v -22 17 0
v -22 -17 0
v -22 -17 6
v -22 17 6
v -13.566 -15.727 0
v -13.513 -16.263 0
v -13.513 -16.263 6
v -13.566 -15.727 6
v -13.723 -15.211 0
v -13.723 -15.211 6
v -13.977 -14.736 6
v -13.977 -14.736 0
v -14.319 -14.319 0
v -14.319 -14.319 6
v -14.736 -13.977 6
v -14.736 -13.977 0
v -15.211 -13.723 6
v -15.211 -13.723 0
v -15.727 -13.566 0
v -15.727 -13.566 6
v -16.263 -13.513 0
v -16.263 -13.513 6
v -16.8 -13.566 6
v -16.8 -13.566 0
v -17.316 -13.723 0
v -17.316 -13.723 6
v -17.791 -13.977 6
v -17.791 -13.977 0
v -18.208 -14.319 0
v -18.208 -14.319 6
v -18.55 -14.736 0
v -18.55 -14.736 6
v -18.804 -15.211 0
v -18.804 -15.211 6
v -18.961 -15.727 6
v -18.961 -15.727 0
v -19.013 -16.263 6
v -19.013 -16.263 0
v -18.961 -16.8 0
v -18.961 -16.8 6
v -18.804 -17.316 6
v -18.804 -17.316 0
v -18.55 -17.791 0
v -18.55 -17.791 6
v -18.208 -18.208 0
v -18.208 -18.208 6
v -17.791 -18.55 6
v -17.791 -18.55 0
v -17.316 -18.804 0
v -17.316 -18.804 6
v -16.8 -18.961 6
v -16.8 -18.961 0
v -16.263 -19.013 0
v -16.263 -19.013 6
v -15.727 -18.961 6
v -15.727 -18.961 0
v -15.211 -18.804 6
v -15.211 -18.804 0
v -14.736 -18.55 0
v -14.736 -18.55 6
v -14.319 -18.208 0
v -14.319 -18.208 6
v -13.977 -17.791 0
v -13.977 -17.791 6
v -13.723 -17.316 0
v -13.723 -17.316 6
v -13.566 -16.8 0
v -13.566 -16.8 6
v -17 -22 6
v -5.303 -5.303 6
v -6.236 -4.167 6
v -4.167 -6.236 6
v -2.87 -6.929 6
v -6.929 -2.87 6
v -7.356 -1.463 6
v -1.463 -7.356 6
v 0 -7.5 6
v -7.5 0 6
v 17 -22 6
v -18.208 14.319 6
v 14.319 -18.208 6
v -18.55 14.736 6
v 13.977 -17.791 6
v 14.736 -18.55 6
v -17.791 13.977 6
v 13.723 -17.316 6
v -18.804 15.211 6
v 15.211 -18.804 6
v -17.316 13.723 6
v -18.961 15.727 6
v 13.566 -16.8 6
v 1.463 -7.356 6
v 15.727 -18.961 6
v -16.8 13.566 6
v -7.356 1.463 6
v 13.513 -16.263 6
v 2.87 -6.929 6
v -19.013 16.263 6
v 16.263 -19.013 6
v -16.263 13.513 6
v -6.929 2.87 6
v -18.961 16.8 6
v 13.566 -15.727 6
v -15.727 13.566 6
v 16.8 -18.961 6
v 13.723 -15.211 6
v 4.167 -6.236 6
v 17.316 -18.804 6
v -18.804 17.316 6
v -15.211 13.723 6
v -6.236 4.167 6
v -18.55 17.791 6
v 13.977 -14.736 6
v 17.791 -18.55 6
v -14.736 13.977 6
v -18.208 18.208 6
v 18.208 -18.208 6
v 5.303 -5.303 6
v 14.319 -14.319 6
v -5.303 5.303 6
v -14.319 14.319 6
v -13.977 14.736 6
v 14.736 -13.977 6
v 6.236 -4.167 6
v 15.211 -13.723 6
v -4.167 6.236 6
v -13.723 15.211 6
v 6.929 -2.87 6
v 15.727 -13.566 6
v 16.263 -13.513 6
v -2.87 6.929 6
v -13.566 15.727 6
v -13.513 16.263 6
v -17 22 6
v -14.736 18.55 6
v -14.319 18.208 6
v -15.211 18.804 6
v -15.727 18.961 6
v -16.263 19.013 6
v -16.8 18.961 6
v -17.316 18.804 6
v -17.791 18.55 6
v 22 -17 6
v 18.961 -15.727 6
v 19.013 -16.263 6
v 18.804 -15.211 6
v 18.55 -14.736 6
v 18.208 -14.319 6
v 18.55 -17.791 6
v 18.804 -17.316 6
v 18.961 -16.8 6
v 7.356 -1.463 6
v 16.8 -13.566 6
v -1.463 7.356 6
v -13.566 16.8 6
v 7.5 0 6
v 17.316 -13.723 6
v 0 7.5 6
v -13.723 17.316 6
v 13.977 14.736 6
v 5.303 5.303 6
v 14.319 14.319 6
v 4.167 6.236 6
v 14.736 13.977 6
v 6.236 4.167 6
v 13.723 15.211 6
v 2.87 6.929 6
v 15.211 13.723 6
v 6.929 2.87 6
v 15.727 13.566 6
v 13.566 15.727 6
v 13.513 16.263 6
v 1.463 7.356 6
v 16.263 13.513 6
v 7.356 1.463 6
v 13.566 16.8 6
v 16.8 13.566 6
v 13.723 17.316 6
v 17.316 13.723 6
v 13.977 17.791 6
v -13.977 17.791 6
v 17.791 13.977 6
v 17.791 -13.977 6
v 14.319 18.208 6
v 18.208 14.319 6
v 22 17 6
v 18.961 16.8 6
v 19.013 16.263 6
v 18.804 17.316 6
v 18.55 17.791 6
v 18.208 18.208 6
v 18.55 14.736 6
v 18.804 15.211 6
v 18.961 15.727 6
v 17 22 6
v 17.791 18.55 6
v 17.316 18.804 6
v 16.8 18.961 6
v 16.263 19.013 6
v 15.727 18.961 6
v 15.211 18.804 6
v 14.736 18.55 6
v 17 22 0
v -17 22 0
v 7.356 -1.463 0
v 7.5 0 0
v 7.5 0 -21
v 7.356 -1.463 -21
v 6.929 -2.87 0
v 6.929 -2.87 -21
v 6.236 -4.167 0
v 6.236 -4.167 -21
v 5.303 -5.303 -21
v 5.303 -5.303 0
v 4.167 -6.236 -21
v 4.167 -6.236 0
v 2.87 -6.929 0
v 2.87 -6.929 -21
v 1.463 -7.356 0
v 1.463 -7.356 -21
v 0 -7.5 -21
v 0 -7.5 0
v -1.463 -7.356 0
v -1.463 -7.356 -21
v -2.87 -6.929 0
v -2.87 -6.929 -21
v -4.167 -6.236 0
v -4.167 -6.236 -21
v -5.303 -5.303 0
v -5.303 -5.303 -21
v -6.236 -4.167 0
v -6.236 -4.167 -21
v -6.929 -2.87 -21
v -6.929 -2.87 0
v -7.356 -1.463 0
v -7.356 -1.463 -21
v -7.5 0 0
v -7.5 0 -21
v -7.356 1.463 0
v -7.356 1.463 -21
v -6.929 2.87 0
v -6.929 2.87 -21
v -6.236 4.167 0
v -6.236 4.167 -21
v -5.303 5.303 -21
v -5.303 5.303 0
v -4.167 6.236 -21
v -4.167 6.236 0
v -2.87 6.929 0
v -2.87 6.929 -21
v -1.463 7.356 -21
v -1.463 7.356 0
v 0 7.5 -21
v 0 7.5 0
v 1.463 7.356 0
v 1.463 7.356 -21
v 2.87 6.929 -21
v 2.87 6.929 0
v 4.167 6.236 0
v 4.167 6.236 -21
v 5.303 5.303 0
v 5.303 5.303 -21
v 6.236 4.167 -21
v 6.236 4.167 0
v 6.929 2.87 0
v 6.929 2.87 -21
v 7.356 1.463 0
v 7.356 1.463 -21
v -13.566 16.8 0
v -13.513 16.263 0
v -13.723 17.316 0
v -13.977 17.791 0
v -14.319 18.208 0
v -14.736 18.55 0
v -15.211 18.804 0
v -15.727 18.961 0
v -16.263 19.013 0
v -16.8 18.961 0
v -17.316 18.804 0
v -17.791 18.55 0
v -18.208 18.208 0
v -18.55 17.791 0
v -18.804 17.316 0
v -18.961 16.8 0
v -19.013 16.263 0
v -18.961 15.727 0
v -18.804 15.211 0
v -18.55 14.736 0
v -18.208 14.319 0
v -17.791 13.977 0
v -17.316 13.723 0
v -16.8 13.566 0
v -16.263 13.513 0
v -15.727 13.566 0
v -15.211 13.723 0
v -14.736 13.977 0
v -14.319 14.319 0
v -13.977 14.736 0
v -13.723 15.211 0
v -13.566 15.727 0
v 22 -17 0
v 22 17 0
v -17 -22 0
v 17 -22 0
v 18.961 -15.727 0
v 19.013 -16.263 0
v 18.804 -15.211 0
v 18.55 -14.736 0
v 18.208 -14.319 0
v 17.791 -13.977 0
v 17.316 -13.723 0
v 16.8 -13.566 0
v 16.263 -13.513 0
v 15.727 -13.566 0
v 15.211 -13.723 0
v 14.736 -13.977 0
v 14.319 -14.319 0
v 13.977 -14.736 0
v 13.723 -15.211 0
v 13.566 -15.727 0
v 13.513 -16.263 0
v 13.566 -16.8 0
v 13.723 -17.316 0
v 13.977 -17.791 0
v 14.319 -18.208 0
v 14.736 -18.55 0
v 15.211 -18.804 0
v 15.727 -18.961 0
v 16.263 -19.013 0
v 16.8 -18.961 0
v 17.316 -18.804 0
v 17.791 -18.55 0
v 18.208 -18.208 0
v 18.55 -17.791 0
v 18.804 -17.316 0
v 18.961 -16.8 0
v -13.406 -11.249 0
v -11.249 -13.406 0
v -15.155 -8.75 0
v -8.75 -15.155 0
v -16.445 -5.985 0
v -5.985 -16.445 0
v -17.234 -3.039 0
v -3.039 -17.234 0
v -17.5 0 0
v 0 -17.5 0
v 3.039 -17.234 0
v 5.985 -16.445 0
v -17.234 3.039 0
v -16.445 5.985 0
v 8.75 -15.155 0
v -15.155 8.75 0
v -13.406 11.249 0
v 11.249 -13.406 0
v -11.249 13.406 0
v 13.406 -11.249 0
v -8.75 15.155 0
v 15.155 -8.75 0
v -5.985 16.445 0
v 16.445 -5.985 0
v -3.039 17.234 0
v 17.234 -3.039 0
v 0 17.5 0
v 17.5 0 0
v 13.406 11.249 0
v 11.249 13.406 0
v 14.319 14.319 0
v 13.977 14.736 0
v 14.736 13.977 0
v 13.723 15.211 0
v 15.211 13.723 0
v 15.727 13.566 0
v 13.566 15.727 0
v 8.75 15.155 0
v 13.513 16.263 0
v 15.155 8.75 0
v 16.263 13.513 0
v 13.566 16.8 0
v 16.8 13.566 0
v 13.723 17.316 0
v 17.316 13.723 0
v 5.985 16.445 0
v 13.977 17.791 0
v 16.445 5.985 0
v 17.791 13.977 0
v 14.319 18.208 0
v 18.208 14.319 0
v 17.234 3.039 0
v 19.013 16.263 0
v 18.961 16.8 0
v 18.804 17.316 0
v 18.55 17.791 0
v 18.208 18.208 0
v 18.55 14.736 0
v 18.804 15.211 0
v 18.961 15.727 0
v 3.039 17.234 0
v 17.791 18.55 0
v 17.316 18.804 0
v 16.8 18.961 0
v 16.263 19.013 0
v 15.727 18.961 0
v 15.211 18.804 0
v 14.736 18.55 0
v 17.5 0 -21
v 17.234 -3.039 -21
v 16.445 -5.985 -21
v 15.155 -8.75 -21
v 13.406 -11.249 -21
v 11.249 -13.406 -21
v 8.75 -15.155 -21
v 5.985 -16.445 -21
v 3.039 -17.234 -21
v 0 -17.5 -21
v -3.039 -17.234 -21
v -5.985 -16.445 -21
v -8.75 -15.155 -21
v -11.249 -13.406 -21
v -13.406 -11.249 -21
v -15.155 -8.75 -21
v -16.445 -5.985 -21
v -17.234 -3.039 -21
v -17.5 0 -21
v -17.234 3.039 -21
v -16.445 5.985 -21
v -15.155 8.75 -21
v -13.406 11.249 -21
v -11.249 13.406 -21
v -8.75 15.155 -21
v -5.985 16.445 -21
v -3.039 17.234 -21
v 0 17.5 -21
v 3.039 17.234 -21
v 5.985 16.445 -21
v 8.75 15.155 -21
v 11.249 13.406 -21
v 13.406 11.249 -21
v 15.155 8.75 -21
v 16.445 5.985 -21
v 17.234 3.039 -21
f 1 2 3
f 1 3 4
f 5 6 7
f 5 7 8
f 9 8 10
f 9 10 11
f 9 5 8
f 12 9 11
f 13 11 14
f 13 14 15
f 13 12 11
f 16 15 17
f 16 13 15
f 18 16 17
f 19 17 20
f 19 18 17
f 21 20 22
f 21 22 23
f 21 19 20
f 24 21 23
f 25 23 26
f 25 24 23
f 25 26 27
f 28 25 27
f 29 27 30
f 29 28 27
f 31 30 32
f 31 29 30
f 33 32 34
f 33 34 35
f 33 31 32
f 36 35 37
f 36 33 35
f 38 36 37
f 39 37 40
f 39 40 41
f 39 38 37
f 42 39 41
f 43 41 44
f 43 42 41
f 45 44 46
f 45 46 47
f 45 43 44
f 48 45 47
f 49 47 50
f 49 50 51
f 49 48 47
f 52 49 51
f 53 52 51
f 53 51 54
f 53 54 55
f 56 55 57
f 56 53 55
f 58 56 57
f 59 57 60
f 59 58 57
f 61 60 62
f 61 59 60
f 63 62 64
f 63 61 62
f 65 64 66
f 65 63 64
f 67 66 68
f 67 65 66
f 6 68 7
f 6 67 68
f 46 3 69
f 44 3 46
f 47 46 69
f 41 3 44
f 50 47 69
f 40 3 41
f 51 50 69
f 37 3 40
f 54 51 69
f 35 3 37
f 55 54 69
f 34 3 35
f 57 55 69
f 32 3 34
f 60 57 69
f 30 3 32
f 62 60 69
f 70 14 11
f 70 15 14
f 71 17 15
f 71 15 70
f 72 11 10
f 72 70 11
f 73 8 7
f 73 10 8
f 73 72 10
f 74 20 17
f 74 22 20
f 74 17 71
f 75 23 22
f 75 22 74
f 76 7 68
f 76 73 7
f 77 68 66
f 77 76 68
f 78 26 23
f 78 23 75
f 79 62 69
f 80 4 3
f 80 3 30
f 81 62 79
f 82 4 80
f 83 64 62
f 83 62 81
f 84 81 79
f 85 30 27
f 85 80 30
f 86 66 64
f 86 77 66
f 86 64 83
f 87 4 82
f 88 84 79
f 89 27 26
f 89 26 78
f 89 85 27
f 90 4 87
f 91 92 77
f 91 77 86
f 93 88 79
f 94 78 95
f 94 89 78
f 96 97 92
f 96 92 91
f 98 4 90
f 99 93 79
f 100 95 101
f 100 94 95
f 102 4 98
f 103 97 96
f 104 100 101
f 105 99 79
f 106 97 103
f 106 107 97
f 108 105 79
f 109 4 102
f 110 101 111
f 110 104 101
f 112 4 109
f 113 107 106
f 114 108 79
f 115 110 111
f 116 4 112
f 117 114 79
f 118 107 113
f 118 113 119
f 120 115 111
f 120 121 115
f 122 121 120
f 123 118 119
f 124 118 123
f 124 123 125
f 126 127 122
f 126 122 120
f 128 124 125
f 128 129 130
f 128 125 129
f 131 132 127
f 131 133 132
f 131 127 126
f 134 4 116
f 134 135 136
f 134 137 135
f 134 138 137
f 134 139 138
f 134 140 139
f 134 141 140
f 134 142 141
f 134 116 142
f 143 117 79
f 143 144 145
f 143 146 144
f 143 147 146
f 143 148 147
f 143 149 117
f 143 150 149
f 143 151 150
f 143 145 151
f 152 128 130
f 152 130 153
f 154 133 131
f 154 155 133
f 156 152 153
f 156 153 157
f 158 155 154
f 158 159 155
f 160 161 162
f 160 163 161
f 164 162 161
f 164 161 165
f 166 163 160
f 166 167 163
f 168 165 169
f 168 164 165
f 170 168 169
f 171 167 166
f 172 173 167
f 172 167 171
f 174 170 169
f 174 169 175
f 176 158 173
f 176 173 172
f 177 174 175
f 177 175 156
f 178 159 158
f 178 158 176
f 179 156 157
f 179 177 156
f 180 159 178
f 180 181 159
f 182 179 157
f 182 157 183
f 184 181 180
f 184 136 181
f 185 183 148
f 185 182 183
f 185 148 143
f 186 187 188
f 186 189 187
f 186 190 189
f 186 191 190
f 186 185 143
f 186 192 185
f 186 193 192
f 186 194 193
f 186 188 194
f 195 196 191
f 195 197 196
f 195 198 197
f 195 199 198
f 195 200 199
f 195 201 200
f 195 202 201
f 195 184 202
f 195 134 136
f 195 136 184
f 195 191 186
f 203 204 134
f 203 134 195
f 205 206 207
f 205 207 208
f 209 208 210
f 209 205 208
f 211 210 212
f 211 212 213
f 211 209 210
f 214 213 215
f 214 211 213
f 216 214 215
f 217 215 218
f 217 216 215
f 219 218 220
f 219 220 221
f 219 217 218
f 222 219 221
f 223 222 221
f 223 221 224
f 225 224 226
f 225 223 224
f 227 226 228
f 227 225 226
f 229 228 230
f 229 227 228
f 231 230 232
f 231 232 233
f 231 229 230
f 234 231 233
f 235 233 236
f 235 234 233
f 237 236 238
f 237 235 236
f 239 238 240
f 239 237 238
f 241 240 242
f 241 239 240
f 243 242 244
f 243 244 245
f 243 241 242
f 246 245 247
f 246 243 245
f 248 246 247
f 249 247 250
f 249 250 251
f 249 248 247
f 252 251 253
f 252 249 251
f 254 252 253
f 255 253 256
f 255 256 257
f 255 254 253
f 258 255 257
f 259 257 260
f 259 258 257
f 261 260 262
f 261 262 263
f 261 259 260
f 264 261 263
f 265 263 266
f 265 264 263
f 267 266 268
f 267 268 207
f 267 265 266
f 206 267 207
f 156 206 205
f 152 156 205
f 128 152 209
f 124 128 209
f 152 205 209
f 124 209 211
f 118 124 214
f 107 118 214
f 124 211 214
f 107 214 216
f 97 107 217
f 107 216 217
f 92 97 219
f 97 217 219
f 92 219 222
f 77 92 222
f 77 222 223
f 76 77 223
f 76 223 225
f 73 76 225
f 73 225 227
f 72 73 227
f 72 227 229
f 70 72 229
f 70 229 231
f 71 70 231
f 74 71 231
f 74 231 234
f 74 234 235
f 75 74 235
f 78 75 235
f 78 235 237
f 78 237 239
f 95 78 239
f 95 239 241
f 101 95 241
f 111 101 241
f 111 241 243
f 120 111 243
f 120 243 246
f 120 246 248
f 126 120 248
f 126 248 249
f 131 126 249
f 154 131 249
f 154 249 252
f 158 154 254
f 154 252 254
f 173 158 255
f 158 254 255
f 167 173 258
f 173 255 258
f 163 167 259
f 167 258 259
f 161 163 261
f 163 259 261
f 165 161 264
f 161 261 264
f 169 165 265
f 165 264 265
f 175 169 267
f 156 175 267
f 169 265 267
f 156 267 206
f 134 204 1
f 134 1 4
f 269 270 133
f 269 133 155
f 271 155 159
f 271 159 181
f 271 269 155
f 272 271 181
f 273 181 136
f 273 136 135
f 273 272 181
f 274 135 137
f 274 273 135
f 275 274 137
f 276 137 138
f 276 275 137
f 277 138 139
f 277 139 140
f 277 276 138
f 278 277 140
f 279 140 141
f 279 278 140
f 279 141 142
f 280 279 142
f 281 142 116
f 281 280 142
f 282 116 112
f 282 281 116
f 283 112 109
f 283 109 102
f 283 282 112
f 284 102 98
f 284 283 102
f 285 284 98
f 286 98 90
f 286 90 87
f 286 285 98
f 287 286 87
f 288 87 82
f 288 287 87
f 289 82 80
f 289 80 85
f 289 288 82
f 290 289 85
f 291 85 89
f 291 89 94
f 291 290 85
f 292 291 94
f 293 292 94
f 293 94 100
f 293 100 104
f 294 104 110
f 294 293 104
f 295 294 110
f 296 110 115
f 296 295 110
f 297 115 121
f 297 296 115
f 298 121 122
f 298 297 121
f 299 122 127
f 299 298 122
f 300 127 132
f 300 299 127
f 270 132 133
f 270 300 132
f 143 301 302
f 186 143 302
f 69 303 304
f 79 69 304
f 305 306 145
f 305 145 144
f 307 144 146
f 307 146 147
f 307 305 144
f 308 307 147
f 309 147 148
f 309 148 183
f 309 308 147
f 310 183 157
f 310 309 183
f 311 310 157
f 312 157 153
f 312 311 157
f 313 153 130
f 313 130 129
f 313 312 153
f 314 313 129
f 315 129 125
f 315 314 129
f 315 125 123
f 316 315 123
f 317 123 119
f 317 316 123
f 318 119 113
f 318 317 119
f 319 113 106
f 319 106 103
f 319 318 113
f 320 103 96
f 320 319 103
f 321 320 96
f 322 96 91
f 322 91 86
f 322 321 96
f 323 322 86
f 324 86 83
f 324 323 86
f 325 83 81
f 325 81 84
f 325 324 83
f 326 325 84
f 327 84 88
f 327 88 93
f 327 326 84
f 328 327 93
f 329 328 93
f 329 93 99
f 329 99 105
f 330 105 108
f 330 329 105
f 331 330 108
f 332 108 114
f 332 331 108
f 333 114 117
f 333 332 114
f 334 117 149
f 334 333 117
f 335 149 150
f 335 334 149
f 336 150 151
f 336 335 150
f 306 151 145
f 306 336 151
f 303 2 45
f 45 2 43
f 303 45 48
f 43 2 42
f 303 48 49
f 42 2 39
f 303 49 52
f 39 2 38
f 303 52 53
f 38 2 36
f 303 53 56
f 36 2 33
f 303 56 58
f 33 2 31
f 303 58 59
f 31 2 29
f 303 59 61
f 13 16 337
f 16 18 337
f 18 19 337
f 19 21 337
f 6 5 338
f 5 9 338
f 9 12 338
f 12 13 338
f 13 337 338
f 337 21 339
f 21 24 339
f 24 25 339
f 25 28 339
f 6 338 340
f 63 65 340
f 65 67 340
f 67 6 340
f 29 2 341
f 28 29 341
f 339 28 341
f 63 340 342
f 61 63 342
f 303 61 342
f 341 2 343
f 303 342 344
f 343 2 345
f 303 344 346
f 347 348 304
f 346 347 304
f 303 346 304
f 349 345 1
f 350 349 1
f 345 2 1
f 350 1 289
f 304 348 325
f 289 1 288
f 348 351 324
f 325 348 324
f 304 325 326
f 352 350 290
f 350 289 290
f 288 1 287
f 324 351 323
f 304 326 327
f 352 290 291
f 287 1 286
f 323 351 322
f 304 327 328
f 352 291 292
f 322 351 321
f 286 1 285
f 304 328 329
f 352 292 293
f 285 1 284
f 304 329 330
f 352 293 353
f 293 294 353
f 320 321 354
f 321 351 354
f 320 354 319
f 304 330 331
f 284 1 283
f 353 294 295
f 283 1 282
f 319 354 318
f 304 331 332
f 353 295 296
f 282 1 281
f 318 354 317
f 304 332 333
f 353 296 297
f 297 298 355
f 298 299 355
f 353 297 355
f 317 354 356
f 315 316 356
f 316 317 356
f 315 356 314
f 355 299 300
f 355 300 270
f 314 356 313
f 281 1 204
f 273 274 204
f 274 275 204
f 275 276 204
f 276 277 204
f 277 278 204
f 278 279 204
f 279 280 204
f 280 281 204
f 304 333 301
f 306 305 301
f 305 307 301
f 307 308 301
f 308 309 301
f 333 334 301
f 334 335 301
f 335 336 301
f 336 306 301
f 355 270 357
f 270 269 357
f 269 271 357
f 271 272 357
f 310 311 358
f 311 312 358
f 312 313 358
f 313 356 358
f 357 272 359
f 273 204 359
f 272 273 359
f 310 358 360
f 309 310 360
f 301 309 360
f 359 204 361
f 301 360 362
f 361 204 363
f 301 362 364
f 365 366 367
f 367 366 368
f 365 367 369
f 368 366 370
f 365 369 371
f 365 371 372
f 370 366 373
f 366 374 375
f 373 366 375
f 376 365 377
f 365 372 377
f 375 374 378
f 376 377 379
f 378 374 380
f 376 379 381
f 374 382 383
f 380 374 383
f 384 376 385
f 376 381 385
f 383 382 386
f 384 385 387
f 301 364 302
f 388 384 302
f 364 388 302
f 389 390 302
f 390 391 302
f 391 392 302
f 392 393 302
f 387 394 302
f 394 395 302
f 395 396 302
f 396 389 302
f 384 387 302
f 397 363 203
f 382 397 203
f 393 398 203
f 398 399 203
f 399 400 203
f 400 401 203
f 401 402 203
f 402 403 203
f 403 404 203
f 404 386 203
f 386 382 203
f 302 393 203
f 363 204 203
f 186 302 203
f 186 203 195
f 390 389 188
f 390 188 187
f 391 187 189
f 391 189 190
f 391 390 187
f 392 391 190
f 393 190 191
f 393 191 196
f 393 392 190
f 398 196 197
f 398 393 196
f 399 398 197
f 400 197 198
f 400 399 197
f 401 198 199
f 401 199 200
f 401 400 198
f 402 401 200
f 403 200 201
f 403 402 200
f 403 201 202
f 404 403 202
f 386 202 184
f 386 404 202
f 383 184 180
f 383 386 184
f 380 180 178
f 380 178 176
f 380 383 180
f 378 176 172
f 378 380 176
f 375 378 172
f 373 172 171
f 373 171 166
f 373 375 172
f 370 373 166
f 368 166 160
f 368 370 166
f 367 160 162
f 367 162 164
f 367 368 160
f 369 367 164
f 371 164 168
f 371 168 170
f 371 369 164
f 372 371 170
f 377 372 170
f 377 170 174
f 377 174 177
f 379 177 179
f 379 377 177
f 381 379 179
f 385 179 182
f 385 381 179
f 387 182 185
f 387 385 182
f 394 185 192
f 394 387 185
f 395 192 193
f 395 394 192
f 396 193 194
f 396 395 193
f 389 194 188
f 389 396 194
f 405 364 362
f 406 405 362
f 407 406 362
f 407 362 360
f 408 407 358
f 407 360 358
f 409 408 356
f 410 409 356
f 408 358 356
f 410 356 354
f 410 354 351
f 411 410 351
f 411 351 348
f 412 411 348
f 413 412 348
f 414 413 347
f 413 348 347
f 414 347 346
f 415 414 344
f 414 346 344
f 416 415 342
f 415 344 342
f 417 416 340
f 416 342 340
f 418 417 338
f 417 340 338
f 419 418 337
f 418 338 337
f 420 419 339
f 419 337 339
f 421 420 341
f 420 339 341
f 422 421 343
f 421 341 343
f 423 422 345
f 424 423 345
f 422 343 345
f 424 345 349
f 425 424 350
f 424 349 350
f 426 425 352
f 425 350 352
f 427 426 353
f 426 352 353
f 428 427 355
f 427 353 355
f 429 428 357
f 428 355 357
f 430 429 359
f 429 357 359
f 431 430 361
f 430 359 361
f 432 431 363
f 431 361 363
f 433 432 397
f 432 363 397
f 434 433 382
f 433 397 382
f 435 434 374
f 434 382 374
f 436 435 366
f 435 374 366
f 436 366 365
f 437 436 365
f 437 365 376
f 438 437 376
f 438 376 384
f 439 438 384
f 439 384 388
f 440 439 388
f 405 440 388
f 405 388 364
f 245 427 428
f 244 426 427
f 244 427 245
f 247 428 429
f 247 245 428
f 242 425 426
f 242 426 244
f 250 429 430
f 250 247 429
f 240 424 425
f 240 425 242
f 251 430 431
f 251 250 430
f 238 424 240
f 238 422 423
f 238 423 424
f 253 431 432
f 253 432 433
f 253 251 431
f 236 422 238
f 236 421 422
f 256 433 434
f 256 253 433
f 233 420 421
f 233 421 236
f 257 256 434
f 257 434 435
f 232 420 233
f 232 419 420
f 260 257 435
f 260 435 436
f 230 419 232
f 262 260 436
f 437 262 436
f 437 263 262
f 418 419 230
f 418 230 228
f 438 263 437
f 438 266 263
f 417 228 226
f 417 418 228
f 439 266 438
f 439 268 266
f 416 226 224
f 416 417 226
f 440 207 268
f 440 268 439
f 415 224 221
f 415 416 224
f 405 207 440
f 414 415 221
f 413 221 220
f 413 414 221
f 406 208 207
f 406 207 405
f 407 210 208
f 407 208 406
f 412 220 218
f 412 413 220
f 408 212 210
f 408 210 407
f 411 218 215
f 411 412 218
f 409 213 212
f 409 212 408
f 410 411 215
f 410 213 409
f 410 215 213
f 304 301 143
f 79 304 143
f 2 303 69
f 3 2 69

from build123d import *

# Parameters (mm, degrees)
SKETCH_1_W          = 44
SKETCH_1_H          = 44
SKETCH_1_R          = 2.75
EXTRUDE_1_DEPTH     = 6
CHAMFER_1_SIZE      = 5
SKETCH_2_R          = 17.5
SKETCH_2_R_2        = 7.5
EXTRUDE_2_DEPTH     = 21
SKETCH_3_R          = 7.5
CUT_EXTRUDE_1_DEPTH = 38.536648758


with BuildPart() as part:
    # 草图1 → 凸台-拉伸1 (new body)
    with BuildSketch(Plane.XY):
        Rectangle(SKETCH_1_W, SKETCH_1_H)
        with Locations((-16.263455967, 16.263455967)):
            Circle(SKETCH_1_R, mode=Mode.SUBTRACT)
        with Locations((16.263455967, 16.263455967)):
            Circle(SKETCH_1_R, mode=Mode.SUBTRACT)
        with Locations((16.263455967, -16.263455967)):
            Circle(SKETCH_1_R, mode=Mode.SUBTRACT)
        with Locations((-16.263455967, -16.263455967)):
            Circle(SKETCH_1_R, mode=Mode.SUBTRACT)
    extrude(amount=EXTRUDE_1_DEPTH)

    # 倒角1
    chamfer_1_edges = [part.edges().sort_by_distance(p)[0] for p in [
        (-22, 22, 3),
        (22, 22, 3),
        (22, -22, 3),
        (-22, -22, 3),
    ]]
    chamfer(chamfer_1_edges, length=CHAMFER_1_SIZE)

    # 草图2 → 凸台-拉伸2 (add)
    with BuildSketch(Plane(origin=(0, 0, 0), x_dir=(-1, 0, 0), z_dir=(0, 0, -1))):
        with Locations(Location((0, 0, 0), (0, 0, 180))):
            Circle(SKETCH_2_R)
        with Locations(Location((0, 0, 0), (0, 0, 180))):
            Circle(SKETCH_2_R_2, mode=Mode.SUBTRACT)
    extrude(amount=EXTRUDE_2_DEPTH)

    # 草图3 → 切除-拉伸1 (cut, through all)
    with BuildSketch(Plane(origin=(0, 0, 0), x_dir=(-1, 0, 0), z_dir=(0, 0, -1))):
        with Locations(Location((0, 0, 0), (0, 0, 180))):
            Circle(SKETCH_3_R)
    extrude(amount=-CUT_EXTRUDE_1_DEPTH, mode=Mode.SUBTRACT)


solid = part.part
